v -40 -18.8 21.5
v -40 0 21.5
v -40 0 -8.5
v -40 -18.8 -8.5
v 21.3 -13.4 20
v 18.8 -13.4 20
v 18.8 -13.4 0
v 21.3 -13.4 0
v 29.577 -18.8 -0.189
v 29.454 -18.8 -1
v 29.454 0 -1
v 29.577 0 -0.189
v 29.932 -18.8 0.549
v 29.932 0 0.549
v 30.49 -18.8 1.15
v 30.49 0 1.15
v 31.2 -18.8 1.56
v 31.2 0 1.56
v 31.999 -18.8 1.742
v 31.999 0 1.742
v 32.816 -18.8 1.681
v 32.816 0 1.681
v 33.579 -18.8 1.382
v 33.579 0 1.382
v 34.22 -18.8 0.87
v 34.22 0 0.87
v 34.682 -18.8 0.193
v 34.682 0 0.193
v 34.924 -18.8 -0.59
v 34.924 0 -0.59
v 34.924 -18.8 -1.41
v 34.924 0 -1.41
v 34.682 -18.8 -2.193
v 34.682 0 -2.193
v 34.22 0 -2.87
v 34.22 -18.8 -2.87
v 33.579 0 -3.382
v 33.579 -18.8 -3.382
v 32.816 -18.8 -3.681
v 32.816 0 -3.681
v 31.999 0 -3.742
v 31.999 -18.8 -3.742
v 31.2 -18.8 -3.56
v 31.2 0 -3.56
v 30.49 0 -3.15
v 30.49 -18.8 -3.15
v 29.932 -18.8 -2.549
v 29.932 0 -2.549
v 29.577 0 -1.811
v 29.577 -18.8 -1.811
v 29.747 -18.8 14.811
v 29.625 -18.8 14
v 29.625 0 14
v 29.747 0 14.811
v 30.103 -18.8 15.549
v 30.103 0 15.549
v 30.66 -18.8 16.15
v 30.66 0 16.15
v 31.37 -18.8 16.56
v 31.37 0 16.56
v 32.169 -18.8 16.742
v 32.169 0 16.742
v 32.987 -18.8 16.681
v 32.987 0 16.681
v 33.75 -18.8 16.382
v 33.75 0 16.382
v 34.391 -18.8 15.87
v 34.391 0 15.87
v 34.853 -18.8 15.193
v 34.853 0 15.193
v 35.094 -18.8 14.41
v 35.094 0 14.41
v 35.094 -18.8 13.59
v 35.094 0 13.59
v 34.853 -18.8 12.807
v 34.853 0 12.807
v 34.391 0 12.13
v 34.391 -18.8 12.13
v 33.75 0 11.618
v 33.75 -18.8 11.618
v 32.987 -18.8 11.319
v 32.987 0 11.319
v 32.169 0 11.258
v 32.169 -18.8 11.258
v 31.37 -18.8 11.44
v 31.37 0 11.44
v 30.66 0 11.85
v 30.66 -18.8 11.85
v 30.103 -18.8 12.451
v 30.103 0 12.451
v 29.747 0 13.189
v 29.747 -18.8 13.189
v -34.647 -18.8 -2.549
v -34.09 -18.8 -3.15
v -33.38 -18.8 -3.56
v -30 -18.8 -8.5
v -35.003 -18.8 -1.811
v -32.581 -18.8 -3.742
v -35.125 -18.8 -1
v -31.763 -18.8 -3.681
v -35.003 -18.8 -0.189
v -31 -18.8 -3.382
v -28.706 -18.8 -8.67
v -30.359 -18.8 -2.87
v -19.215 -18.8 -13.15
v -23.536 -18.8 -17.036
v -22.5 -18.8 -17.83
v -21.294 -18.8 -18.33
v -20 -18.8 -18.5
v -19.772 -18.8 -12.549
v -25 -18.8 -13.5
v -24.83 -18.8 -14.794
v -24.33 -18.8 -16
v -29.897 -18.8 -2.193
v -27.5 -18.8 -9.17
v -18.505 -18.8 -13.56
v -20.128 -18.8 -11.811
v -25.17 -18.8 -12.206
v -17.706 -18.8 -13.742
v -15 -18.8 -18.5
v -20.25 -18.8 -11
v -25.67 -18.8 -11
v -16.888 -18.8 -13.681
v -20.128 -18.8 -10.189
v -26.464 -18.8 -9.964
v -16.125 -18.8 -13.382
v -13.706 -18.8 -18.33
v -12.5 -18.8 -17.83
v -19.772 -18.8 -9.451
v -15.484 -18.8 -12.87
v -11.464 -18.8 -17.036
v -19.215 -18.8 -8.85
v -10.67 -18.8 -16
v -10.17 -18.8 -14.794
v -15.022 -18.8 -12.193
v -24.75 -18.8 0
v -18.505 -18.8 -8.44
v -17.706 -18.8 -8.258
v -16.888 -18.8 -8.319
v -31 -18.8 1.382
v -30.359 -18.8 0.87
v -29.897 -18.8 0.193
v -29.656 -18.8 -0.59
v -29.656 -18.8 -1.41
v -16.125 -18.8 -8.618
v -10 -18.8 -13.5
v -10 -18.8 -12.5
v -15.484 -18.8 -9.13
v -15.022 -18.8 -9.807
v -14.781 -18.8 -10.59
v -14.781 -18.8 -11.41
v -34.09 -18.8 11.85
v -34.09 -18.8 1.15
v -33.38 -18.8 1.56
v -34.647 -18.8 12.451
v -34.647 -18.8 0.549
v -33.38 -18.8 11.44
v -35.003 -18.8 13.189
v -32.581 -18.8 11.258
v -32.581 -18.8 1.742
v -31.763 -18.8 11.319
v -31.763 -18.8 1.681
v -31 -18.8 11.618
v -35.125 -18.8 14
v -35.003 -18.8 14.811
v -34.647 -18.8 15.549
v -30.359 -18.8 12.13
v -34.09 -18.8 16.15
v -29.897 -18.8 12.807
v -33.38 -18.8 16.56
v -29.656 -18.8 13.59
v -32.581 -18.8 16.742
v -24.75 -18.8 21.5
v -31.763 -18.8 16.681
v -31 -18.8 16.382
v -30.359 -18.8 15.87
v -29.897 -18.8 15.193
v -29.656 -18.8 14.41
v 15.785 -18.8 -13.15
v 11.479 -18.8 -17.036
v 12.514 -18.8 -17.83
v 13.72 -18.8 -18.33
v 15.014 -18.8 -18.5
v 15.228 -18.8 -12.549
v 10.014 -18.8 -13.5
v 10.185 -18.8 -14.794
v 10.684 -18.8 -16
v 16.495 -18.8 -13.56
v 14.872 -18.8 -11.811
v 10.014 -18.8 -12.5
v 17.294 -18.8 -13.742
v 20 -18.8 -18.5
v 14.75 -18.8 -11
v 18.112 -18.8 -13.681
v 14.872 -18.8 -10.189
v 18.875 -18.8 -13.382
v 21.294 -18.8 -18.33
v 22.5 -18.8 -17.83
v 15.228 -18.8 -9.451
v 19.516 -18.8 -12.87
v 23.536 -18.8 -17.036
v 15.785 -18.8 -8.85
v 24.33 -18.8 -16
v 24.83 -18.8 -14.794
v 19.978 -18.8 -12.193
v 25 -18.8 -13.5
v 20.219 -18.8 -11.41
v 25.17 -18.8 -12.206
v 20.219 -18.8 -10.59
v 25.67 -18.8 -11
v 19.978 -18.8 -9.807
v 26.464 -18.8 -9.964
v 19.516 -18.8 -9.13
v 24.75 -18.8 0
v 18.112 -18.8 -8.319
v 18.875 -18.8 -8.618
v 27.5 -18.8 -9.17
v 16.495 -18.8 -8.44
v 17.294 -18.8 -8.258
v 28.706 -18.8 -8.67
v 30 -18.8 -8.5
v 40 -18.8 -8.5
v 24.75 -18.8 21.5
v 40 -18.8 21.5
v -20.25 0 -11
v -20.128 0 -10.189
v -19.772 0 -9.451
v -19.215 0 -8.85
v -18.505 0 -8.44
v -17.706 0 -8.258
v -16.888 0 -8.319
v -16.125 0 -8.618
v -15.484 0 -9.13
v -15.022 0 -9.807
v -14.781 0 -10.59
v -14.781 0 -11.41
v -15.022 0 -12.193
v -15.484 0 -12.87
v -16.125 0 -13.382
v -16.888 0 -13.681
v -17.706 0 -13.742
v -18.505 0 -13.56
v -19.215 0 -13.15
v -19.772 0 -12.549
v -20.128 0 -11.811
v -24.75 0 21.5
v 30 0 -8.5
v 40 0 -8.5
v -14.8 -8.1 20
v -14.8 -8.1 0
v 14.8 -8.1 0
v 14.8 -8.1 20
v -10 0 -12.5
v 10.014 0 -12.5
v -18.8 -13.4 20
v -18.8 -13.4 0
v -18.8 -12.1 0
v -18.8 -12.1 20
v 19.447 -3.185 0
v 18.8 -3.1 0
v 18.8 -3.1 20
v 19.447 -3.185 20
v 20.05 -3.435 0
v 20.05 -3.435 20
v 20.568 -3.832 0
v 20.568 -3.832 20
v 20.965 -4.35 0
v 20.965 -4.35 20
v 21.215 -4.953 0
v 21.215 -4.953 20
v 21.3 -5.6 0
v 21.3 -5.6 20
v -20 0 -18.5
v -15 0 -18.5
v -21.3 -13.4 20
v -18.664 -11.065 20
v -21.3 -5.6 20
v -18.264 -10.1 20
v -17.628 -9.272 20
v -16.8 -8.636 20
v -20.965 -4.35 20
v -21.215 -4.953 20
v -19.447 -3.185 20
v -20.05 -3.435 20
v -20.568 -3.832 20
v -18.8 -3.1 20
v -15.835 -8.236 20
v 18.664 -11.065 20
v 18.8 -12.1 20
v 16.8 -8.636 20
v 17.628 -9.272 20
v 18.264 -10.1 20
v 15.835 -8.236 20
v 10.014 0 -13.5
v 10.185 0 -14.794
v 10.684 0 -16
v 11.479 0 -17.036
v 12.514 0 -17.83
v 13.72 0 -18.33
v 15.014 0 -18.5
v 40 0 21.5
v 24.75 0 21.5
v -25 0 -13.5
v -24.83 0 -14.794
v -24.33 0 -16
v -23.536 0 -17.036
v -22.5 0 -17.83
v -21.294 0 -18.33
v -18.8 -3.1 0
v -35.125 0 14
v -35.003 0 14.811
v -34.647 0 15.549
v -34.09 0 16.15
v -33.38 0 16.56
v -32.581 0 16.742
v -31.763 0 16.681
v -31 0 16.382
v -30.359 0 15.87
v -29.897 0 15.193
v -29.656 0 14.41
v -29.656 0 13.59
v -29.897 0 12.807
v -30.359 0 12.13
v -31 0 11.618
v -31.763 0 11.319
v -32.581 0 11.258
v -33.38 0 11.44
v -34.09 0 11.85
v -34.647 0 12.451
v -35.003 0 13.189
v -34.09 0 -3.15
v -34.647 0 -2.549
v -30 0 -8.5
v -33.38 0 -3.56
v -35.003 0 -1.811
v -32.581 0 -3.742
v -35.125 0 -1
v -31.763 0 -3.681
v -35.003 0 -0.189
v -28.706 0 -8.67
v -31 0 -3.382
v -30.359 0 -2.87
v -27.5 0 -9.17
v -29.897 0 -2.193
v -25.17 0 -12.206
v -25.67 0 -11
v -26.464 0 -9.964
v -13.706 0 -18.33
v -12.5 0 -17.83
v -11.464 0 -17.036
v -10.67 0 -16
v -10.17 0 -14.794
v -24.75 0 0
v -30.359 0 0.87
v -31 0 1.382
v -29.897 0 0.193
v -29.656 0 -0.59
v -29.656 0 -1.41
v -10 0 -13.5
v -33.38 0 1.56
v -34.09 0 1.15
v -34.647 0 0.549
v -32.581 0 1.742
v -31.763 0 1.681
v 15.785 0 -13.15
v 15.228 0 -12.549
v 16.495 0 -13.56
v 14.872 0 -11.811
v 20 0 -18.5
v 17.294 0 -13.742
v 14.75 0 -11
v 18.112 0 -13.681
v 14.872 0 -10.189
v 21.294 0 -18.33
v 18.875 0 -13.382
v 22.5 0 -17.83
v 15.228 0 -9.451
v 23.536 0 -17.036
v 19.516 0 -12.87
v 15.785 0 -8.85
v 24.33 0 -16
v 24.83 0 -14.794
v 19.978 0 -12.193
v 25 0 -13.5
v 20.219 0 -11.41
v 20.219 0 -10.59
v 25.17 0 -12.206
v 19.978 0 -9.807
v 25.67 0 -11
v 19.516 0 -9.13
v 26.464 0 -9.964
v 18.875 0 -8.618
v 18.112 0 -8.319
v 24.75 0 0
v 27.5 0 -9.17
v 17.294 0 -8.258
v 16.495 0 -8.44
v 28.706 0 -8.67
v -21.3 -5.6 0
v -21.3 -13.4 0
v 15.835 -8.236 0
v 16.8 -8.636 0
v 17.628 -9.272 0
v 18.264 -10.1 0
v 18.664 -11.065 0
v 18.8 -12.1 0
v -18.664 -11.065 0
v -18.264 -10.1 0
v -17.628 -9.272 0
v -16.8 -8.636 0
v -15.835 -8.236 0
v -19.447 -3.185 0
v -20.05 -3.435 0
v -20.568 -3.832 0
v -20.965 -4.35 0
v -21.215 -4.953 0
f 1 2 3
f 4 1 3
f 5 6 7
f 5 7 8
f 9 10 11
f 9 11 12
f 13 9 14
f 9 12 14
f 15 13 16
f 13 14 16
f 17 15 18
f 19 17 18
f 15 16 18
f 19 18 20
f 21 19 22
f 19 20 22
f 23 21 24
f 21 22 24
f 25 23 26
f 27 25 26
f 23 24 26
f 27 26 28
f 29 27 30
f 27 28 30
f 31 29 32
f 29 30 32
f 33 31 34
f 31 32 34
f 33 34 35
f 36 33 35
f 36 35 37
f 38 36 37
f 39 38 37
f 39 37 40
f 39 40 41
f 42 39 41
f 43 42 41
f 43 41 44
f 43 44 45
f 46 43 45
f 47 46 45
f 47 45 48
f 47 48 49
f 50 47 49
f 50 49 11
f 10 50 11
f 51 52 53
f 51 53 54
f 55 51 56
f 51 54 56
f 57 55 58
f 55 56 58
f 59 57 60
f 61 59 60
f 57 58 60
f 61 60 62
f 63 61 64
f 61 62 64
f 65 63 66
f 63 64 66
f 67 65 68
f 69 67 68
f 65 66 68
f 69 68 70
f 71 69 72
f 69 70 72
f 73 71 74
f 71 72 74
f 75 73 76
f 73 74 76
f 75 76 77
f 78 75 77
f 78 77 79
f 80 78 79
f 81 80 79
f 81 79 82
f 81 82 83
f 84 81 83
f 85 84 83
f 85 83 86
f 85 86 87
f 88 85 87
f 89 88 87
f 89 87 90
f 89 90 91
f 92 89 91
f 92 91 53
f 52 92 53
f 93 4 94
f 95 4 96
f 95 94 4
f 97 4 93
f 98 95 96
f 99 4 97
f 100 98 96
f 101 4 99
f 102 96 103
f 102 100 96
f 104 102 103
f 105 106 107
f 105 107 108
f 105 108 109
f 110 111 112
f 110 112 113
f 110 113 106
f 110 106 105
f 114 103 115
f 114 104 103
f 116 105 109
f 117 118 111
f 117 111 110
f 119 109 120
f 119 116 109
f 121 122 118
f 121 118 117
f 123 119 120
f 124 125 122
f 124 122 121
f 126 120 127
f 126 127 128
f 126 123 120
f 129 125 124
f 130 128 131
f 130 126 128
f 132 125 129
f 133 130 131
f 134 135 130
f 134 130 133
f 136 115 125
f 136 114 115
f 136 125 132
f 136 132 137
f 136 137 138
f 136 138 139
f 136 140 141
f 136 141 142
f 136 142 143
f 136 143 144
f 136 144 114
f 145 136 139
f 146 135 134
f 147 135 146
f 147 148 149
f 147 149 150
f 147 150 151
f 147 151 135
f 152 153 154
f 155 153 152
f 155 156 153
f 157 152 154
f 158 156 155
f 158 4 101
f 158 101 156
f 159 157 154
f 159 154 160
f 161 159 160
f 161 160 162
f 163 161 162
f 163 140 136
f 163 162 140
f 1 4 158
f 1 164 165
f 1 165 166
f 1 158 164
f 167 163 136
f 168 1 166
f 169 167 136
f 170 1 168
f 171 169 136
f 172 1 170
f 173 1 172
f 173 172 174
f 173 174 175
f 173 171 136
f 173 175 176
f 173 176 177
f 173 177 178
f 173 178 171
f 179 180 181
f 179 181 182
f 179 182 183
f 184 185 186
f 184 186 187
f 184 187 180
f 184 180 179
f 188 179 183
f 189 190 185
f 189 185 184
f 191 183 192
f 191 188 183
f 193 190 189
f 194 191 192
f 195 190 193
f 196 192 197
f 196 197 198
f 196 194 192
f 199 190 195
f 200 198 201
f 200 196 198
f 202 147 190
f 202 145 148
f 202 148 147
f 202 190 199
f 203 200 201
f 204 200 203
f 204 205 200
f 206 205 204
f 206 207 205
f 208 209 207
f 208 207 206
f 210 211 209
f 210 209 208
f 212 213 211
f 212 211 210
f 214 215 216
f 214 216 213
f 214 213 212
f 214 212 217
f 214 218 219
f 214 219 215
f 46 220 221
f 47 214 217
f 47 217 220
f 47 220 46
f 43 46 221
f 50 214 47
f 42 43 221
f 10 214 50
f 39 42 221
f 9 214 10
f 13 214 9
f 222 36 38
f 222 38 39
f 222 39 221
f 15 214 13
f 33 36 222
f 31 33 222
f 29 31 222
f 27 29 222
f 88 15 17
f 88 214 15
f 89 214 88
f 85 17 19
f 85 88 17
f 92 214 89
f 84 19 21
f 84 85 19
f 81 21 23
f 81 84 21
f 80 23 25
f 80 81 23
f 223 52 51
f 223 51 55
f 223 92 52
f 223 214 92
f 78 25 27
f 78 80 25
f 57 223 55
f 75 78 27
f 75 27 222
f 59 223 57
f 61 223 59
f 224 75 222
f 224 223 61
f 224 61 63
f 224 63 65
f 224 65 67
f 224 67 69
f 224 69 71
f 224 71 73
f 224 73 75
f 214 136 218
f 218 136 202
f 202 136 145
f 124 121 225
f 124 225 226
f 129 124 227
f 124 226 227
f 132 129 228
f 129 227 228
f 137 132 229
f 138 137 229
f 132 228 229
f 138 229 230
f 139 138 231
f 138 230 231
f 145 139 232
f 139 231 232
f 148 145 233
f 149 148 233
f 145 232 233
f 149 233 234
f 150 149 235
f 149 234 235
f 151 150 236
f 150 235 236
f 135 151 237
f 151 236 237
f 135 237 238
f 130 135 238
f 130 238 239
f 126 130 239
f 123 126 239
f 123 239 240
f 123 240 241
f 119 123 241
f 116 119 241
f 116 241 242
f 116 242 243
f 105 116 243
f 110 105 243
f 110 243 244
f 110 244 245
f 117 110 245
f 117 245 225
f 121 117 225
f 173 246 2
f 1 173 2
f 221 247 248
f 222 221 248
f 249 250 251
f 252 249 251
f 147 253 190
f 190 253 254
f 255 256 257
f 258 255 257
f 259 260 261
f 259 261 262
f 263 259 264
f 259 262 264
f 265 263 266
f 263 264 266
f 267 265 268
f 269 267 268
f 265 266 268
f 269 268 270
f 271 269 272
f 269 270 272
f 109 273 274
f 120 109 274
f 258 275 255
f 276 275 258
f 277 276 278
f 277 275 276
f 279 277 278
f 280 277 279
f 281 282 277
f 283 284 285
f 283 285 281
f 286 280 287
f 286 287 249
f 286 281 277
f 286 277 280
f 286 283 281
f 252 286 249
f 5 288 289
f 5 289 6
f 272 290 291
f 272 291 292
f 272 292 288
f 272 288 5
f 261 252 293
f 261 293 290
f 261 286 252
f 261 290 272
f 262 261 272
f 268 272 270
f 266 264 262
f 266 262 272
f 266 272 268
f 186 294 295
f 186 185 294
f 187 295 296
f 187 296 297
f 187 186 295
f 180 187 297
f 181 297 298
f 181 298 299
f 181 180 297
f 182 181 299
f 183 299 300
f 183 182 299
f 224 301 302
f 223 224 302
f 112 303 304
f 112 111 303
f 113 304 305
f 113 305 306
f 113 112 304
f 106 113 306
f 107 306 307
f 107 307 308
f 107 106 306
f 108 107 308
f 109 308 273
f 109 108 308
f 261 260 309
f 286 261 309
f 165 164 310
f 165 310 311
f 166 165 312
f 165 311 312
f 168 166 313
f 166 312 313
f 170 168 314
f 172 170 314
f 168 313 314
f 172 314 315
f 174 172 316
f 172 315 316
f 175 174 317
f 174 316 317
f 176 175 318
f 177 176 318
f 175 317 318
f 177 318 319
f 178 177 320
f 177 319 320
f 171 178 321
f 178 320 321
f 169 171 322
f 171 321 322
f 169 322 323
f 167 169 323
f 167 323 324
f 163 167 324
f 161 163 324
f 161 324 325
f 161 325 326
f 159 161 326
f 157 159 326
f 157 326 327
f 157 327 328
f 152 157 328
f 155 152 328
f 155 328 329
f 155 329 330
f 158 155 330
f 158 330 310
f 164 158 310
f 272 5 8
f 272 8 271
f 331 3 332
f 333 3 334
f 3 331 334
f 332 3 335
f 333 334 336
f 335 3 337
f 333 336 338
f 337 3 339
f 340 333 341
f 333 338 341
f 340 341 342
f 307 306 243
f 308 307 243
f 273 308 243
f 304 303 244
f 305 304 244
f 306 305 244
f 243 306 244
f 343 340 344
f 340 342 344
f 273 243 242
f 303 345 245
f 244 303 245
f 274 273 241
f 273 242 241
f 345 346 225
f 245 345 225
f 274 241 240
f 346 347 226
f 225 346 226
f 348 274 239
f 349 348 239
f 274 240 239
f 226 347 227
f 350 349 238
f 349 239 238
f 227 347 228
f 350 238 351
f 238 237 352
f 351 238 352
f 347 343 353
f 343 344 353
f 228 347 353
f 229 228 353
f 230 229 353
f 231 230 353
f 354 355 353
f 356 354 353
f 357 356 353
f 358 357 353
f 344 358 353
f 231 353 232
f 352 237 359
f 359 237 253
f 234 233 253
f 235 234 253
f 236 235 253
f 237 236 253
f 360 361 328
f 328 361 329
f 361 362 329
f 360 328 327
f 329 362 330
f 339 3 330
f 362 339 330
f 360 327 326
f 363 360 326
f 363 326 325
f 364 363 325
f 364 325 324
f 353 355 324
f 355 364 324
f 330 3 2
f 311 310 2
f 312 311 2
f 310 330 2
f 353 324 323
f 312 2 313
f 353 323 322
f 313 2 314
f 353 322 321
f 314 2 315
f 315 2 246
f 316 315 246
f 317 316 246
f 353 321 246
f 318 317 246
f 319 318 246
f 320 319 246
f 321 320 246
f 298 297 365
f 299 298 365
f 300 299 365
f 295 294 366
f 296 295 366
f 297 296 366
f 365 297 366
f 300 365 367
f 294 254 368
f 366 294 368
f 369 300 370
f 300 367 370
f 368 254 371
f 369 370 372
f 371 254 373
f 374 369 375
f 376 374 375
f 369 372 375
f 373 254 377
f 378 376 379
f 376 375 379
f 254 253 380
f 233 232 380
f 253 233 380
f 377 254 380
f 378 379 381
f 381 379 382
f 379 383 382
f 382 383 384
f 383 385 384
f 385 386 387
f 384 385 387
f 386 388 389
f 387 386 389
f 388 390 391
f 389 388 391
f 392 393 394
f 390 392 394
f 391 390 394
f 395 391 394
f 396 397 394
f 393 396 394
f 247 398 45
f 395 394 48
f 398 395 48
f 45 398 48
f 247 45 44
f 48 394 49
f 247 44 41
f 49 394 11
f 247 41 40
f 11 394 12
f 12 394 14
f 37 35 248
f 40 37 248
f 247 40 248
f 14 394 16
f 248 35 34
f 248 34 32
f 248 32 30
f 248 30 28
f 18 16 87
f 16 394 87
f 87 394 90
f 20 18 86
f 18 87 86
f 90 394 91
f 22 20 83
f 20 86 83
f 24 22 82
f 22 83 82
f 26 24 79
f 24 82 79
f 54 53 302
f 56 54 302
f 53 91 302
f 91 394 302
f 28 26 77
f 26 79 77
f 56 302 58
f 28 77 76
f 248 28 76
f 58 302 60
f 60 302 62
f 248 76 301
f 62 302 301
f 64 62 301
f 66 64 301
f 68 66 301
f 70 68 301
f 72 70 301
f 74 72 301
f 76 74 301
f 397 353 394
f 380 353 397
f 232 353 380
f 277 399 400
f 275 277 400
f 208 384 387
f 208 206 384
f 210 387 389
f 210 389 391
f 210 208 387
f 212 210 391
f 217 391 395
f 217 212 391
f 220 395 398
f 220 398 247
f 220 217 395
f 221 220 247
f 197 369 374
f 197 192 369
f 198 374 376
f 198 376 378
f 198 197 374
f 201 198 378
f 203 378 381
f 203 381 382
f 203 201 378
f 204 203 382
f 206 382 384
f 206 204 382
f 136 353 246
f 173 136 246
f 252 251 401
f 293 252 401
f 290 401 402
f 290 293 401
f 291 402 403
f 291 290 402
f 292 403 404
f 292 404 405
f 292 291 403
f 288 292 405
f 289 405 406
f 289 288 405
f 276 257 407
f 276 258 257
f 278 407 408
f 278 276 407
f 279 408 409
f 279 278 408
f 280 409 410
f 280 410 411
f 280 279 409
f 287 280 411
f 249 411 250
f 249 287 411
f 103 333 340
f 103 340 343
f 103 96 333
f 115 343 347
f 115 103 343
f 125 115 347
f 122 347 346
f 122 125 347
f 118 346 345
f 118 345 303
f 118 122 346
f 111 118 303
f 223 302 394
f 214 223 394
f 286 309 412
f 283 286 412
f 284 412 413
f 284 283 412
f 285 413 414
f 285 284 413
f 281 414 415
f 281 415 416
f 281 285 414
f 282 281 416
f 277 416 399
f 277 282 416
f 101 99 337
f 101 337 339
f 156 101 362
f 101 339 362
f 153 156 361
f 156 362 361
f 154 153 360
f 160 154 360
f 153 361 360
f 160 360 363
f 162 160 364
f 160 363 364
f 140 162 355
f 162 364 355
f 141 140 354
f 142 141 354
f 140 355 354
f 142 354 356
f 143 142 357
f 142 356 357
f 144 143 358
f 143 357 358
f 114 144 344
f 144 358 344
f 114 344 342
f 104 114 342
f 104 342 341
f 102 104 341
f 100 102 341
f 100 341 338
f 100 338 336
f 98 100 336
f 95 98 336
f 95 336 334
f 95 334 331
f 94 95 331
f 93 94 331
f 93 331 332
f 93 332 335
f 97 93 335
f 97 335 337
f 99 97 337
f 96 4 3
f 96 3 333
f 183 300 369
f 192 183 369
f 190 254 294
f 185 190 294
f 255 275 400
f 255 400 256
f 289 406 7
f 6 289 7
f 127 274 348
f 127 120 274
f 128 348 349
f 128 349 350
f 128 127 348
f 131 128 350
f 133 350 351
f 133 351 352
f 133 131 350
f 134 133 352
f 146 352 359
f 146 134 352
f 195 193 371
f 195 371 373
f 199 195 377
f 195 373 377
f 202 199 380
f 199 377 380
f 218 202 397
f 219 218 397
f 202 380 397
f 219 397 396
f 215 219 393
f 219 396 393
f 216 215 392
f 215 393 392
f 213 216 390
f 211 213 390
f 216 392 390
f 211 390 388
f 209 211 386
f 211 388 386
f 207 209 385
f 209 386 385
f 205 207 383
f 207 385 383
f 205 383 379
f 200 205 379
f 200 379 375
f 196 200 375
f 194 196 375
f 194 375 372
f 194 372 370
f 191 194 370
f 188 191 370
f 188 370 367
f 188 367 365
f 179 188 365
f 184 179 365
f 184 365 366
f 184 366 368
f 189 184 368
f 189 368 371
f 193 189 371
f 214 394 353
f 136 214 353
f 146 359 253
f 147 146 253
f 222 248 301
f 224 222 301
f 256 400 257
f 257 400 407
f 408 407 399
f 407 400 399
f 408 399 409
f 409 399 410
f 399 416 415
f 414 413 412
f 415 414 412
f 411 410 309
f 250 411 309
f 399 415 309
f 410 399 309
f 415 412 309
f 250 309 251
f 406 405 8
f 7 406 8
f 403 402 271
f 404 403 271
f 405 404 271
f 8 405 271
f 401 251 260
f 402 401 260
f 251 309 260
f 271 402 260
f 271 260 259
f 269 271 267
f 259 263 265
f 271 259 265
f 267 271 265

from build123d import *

# Parameters (mm, degrees)
F1_DEPTH = 18.8
F3_DEPTH = 20
F4_R     = 4
F5_R     = 2.5
F6_R     = 2.5
F8_R     = 4.99999
F12_D    = 5.5


# Not quite as in the source:
# - two fillets or chamfers of one size are made in one step
# - a fillet or chamfer is up to 0.001 mm smaller than in the source, because OpenCascade refuses the exact size


with BuildPart() as f1:
    # F0 (on Front) → F1 (new body)
    with BuildSketch(Plane.XZ):
        Polygon((-24.75, 21.5), (-40, 21.5), (-40, -8.5), (-25, -8.5), (-25, -18.5), (-10, -18.5), (-10, -12.5), (10.0144529715, -12.5), (10.0144529715, -18.5), (25, -18.5), (25, -8.5), (40, -8.5), (40, 21.5), (24.75, 21.5), (24.75, 0), (-24.75, 0), align=None)
    extrude(amount=F1_DEPTH)

    # F8 (radius 5 in the source; OpenCascade refuses exactly that, so slightly less here)
    f8_edges = [f1.edges().sort_by_distance(p)[0] for p in [
        (-25, -9.4, -18.5),
        (25, -9.4, -18.5),
        (-25, -9.4, -8.5),
        (-10, -9.4, -18.5),
        (10.014453, -9.4, -18.5),
        (25, -9.4, -8.5),
    ]]
    fillet(f8_edges, radius=F8_R)

    # F12 (through all)
    with Locations(Plane.XZ.offset(18.8)):
        with Locations((-32.375, 14), (-32.375, -1), (-17.5, -11), (17.5, -11), (32.2044789791, -1), (32.375, 14)):
            Hole(F12_D / 2)


with BuildPart() as f3:
    # F2 (on face) → F3 (new body)
    with BuildSketch(Plane.XY):
        Polygon((21.3, -3.1), (-21.3, -3.1), (-21.3, -13.4), (-18.8, -13.4), (-18.8, -8.1), (18.8, -8.1), (18.8, -13.4), (21.3, -13.4), align=None)
    extrude(amount=F3_DEPTH)

    # F4
    f4_edges = [f3.edges().sort_by_distance(p)[0] for p in [
        (-18.8, -8.1, 10),
        (18.8, -8.1, 10),
    ]]
    fillet(f4_edges, radius=F4_R)

    # F5
    f5_edges = [f3.edges().sort_by_distance(p)[0] for p in [
        (21.3, -3.1, 10),
    ]]
    fillet(f5_edges, radius=F5_R)

    # F6
    f6_edges = [f3.edges().sort_by_distance(p)[0] for p in [
        (-21.3, -3.1, 10),
    ]]
    fillet(f6_edges, radius=F6_R)


solid = Compound([f1.part, f3.part])
